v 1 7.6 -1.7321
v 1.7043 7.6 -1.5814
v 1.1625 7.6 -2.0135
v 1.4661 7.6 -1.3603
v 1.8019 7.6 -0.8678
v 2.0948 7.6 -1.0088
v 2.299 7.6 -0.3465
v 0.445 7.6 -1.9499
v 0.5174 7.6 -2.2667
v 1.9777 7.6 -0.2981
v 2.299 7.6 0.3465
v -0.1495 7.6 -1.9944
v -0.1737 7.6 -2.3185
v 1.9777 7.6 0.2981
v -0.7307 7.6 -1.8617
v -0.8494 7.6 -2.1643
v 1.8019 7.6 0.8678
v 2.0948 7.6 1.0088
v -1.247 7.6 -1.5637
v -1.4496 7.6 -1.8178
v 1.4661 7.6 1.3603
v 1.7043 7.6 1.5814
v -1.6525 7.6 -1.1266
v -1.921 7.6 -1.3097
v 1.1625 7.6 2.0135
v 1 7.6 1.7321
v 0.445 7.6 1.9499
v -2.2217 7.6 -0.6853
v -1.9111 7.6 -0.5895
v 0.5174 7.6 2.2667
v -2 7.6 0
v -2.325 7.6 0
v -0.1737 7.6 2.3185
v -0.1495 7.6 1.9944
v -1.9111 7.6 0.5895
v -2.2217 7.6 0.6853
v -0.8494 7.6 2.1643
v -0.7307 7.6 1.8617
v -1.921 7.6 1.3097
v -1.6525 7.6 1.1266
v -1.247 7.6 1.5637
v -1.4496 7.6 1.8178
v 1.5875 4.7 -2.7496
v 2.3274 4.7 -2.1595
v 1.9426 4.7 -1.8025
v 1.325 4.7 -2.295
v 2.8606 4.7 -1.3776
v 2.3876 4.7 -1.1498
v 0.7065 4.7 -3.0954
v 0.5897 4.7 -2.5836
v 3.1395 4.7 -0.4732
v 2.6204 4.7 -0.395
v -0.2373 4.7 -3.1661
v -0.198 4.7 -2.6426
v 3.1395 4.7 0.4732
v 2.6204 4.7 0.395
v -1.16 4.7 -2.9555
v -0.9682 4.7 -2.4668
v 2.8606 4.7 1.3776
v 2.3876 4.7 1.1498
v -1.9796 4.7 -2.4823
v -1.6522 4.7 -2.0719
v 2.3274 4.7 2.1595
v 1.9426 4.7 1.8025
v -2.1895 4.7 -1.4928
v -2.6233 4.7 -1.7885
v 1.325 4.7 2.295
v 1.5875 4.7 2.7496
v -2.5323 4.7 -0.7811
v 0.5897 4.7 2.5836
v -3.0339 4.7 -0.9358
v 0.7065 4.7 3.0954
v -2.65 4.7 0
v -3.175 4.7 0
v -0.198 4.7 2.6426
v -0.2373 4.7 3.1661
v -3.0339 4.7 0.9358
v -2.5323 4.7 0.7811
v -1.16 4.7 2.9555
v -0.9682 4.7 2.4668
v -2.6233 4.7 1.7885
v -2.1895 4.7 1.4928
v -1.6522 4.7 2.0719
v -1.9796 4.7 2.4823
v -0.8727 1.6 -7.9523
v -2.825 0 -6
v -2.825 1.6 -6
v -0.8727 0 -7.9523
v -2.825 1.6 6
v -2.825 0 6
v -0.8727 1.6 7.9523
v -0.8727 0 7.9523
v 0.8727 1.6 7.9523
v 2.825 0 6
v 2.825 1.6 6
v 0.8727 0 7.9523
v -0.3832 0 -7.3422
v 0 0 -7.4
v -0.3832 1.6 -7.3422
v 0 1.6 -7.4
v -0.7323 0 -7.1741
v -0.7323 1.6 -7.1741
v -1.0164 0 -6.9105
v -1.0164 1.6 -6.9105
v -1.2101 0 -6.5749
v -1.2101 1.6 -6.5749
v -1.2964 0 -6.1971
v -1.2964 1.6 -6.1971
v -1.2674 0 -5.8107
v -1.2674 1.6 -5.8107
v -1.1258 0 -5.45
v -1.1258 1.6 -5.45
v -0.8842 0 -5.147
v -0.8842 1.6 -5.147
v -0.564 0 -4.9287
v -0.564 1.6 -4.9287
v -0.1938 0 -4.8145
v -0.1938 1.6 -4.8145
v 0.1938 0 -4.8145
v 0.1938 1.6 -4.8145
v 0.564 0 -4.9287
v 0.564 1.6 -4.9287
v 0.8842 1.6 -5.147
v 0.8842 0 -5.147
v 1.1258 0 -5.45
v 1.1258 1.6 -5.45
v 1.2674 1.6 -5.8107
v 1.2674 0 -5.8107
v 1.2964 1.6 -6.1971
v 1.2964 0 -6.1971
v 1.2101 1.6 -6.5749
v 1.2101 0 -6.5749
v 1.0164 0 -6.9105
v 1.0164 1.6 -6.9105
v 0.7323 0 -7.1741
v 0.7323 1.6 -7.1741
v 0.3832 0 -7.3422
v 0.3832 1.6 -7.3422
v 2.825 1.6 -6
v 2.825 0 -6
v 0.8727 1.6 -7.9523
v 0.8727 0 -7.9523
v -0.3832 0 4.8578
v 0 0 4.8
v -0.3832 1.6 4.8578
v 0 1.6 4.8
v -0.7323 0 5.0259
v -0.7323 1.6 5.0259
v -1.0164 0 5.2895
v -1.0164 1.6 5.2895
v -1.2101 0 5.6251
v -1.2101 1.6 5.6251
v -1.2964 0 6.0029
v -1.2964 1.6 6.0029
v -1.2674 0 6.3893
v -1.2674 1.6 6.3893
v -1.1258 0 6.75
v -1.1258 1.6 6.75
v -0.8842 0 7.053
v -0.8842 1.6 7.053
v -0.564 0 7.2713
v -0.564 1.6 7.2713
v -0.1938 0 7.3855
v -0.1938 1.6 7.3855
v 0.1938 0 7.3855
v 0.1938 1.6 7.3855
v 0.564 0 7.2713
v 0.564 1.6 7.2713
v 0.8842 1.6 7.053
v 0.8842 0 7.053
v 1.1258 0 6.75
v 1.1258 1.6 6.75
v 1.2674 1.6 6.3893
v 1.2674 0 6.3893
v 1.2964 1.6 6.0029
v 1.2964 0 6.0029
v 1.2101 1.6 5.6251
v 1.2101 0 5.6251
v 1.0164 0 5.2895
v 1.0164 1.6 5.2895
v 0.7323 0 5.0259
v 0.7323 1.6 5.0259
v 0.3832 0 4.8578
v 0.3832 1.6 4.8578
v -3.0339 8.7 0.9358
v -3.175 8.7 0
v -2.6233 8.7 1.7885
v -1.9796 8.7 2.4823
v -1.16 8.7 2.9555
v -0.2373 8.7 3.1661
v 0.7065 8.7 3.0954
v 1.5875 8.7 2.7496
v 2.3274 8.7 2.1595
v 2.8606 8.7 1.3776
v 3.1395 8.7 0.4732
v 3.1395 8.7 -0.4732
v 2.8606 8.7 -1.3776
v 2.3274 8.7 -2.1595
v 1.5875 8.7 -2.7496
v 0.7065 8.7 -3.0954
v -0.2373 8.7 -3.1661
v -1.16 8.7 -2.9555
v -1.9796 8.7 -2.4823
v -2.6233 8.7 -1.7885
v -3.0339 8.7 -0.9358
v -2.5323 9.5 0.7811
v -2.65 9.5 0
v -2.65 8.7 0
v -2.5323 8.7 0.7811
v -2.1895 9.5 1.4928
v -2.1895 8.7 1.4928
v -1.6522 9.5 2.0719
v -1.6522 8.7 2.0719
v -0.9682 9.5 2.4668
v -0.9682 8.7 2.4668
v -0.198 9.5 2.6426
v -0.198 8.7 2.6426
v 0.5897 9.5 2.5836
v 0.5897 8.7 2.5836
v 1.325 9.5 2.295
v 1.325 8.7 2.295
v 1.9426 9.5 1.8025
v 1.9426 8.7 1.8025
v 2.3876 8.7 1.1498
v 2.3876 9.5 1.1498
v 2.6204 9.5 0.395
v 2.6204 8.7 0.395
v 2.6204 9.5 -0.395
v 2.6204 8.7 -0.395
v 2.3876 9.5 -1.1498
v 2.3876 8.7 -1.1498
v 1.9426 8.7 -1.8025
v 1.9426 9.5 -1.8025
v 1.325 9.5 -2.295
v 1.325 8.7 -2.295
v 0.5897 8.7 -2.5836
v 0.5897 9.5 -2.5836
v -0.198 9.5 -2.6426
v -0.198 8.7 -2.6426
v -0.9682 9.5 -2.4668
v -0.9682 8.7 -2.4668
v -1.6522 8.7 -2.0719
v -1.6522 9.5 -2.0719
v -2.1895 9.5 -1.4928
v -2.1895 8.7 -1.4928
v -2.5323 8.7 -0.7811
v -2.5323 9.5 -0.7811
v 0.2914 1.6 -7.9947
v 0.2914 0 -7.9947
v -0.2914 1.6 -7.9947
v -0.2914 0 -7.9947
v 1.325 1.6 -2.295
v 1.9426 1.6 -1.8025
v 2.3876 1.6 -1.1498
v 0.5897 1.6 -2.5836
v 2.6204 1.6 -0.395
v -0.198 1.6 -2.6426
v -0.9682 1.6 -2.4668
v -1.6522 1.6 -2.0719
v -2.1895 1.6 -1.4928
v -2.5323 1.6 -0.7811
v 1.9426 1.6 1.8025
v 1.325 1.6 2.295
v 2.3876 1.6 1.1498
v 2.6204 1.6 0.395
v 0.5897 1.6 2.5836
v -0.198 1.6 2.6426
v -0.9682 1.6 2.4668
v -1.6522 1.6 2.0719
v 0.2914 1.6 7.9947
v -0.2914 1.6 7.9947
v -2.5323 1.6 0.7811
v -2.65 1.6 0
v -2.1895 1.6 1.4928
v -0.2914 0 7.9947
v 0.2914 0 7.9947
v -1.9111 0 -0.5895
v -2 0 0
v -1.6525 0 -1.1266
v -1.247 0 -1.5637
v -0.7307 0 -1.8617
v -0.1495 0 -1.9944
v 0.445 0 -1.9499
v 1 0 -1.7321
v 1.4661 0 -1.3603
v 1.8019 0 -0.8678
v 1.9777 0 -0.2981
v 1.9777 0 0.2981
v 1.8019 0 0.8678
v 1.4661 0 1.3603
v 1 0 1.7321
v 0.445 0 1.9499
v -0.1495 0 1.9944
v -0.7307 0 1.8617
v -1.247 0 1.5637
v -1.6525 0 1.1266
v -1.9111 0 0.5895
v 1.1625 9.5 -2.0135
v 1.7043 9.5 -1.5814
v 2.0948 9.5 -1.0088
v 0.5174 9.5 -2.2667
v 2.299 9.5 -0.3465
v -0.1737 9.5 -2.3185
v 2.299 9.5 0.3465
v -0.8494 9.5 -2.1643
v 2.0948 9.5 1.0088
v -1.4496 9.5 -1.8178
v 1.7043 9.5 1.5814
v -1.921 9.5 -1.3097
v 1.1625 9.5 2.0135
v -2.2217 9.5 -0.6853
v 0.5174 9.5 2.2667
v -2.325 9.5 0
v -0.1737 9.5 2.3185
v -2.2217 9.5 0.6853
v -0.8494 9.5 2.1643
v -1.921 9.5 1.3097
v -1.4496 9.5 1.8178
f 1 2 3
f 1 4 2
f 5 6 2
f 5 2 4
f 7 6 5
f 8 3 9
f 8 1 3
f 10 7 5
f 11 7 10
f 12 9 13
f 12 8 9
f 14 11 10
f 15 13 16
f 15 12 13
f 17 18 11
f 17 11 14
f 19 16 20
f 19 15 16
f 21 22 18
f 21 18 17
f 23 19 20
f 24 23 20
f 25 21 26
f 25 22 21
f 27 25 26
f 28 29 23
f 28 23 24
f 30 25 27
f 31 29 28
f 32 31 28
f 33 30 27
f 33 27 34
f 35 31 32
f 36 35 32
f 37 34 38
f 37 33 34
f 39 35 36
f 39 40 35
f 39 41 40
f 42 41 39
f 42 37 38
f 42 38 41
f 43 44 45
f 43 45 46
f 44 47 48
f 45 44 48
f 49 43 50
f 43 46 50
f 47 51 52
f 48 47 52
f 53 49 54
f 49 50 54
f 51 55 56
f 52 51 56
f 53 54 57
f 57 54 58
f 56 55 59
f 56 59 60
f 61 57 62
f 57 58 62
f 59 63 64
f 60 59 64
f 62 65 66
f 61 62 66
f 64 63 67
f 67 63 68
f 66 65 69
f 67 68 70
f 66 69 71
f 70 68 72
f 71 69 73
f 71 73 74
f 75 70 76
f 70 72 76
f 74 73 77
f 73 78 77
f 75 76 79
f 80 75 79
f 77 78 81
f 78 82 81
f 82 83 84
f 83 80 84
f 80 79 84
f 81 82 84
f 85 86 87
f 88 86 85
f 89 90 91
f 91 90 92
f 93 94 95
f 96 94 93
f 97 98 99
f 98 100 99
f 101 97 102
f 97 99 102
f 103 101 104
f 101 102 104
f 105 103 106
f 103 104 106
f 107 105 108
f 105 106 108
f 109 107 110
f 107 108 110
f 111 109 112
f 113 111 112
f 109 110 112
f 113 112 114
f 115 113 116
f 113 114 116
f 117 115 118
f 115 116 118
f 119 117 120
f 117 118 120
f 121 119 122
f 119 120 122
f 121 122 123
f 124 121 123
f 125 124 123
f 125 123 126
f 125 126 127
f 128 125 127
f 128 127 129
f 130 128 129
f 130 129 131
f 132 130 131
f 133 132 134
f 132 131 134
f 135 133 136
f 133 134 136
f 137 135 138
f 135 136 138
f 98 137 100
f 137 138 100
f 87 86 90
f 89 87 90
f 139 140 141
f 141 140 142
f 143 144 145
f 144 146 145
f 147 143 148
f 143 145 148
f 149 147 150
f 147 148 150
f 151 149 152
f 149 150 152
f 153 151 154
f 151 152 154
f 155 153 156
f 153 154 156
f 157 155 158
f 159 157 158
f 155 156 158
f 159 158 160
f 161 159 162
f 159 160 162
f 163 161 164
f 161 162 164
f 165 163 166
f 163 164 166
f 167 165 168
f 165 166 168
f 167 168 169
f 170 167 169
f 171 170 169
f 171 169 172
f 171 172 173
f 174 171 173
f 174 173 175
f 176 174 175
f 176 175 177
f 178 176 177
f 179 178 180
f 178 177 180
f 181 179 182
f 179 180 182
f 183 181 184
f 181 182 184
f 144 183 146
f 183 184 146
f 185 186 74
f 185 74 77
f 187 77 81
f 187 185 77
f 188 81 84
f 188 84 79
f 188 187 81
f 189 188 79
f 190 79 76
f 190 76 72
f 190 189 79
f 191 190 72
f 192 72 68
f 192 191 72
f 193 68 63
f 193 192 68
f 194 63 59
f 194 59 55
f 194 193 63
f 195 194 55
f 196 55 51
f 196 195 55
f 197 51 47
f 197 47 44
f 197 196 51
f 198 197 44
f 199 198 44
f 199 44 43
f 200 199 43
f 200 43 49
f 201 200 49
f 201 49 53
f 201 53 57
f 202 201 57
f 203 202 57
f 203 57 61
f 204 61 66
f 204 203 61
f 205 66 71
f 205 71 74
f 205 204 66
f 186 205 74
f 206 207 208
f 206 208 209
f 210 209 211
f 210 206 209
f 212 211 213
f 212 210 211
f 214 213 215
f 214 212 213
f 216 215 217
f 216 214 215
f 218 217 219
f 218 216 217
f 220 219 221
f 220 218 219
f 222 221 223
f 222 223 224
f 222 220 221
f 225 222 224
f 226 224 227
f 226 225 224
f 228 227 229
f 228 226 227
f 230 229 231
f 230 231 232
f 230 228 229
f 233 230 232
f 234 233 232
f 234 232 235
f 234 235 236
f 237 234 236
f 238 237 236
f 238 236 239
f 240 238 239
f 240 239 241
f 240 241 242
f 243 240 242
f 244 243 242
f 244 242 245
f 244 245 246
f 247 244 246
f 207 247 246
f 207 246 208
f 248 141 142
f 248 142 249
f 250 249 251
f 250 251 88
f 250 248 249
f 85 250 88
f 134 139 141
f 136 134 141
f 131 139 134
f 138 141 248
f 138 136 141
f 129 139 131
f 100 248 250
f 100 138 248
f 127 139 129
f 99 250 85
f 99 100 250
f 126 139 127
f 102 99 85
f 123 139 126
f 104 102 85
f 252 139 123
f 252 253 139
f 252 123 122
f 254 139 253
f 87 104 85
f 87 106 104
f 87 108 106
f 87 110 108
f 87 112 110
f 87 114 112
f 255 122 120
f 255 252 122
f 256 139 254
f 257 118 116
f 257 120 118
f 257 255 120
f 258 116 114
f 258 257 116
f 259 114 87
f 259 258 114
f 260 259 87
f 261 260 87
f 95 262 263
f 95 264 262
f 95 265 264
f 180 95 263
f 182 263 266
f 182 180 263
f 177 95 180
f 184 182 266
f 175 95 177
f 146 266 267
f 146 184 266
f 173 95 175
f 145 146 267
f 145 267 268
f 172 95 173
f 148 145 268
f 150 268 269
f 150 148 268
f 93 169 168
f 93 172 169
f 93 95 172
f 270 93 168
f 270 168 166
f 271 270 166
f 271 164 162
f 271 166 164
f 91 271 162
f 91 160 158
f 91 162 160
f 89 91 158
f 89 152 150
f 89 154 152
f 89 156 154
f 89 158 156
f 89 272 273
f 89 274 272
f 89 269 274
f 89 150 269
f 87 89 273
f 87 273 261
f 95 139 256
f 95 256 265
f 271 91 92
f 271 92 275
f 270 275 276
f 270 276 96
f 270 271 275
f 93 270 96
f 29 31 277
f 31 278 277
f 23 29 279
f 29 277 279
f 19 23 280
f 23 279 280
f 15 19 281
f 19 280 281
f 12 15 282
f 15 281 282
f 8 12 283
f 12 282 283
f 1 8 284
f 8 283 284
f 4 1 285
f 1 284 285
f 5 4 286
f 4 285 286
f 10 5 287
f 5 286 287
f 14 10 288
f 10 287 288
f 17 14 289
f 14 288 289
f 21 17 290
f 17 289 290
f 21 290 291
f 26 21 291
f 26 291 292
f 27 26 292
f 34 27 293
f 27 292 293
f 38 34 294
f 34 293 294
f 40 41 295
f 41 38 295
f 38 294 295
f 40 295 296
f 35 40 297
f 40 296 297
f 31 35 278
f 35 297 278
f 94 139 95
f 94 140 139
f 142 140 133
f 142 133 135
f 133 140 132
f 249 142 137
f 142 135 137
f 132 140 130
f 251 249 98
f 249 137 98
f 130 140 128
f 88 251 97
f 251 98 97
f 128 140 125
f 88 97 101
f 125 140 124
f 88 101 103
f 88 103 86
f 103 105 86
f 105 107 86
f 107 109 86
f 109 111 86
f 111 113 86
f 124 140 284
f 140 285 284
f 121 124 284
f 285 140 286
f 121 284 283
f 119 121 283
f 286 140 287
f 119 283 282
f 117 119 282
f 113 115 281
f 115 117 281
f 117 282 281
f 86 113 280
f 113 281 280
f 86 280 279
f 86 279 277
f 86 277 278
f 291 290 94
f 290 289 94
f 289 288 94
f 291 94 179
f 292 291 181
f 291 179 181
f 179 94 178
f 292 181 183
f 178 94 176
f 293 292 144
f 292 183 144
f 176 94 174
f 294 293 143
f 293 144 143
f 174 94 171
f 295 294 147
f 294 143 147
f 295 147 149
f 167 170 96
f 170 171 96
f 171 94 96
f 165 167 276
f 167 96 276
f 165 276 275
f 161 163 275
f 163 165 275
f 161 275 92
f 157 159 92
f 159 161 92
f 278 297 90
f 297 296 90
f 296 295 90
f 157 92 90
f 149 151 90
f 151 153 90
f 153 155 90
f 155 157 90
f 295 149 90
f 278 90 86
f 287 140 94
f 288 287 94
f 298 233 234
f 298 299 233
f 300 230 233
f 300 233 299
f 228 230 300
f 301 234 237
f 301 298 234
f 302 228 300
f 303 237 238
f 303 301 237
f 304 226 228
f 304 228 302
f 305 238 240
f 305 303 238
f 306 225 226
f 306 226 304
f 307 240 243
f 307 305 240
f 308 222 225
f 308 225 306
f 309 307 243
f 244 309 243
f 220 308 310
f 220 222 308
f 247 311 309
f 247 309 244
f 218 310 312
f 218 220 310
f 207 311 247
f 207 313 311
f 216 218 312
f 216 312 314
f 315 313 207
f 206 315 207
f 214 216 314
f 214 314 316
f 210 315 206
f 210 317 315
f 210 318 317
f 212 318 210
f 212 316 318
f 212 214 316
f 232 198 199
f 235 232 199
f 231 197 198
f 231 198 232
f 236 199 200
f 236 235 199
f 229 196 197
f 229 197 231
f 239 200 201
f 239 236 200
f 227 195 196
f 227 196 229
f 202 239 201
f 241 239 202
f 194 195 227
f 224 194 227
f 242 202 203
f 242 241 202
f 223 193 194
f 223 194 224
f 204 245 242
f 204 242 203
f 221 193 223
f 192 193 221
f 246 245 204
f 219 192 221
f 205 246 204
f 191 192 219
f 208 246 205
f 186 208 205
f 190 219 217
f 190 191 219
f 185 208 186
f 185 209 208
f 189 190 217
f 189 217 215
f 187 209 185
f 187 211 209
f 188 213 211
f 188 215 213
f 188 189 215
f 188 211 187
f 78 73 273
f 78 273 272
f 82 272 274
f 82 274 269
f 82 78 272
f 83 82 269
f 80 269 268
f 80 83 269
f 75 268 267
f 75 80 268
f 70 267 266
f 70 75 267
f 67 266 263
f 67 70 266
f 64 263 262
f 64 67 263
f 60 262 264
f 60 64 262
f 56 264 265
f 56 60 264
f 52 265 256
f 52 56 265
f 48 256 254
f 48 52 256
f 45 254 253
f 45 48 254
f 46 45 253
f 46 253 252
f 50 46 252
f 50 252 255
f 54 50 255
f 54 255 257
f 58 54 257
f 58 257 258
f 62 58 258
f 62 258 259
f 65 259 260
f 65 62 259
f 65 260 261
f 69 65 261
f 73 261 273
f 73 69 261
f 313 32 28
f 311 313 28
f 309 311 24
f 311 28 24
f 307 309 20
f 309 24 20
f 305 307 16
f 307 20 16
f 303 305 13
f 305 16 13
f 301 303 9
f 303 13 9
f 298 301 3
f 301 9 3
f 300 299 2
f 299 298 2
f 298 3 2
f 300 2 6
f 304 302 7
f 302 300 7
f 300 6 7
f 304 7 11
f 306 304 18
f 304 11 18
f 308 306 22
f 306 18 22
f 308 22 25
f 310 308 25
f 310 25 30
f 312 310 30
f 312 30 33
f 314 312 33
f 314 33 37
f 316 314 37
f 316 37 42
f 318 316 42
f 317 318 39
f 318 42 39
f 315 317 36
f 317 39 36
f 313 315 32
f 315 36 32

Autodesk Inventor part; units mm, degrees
ref_plane "YZ Plane" through (0, 0, 0) normal (1, 0, 0) x (0, 1, 0)
ref_plane "XZ Plane" through (0, 0, 0) normal (0, 1, 0) x (-1, 0, 0)
ref_plane "XY Plane" through (0, 0, 0) normal (0, 0, 1) x (1, 0, 0)
sketch "Sketch10" plane through (0, 0, 0) normal (0, 0, 1) x (1, 0, 0)
  line L0 (-2, 0) -> (-8, 0)
  line L1 (-8, 0) -> (-8, 1.6)
  line L2 (-8, 1.6) -> (-2.65, 1.6)
  line L3 (-2.65, 1.6) -> (-2.65, 4.7)
  line L4 (-2.65, 4.7) -> (-3.175, 4.7)
  line L5 (-3.175, 4.7) -> (-3.175, 8.7)
  line L6 (-2, 7.6) -> (-2, 0)
  line L7 (-3.175, 8.7) -> (-2.65, 8.7)
  line L8 (-2.65, 8.7) -> (-2.65, 9.5)
  line L9 (-2.65, 9.5) -> (-2.325, 9.5)
  line L10 (0, -1.9) -> (0, 11.4) projected
  line L11 (-2.325, 9.5) -> (-2.325, 7.6)
  line L12 (-2.325, 7.6) -> (-2, 7.6)
  point P0 (0, 0)
  dimension "d39" = 2
  dimension "d41" = 0.8
  dimension "d42" = 4
  dimension "d43" = 2.65
  dimension "d44" = 1.6
  dimension "d45" = 8
  dimension "d46" = 3.175
  dimension "d66" = 2.325
  dimension "d67" = 1.9
  dimension "d68" = 9.5
revolve "Revolution1" add sketch "Sketch10" angle 360 about axis through (0, -10, 0) along (0, 1, 0)
sketch "Sketch11" plane through (0, 0, 0) normal (0, -1, 0) x (1, 0, 0)
  circle A0 centre (0, 0) radius 8 projected
  line L0 (2.825, -7.4846) -> (2.825, 7.4846)
  line L1 (-2.825, -7.4846) -> (-2.825, 7.4846)
  arc A1 (2.825, -7.4846) -> (2.825, 7.4846) centre (0, 0) ccw
  arc A2 (-2.825, 7.4846) -> (-2.825, -7.4846) centre (0, 0) ccw
  dimension "d48" = 5.65
extrude "Extrusion7" cut sketch "Sketch11" against normal up to surface (1.6 mm away) contours A0 L0 | L1 A0
sketch "Sketch12" plane through (0, 0, 0) normal (0, -1, 0) x (1, 0, 0)
  line L0 (2.825, 7.4846) -> (2.825, -7.4846) projected
  line L1 (2.825, 6) -> (0.8727, 7.9523)
  line L2 (2.825, -6) -> (0.8727, -7.9523)
  arc A0 (-2.825, -7.4846) -> (2.825, -7.4846) centre (0, 0) ccw projected
  arc A1 (2.825, 7.4846) -> (-2.825, 7.4846) centre (0, 0) ccw projected
  line L3 (0, -11.2) -> (0, 11.2) projected
  line L4 (-2.825, 6) -> (-0.8727, 7.9523)
  line L5 (-2.825, -6) -> (-0.8727, -7.9523)
  line L6 (-2.825, 7.4846) -> (-2.825, -7.4846) projected
  dimension "d51" = 12
  dimension "d52" = 6
  dimension "d53" = 45
  dimension "d54" = 45
extrude "Extrusion8" cut sketch "Sketch12" against normal through all contours L0 L1 A1 | L0 A0 L2 | L4 L6 A1 | A0 L6 L5
sketch "Sketch13" plane through (0, 0, 0) normal (0, -1, 0) x (1, 0, 0)
  point P0 (0, 0)
  point P1 (0, 6.1)
  point P2 (0, -6.1)
  dimension "d57" = 12.2
  dimension "d58" = 6.1
hole "Hole3" at (0, 0, 6.1) at (0, 0, -6.1) direction (0, 1, 0) diameter 2.6 end through all
thread "Thread2" size "1/4-36 UNS" class "2A" standard "ANSI Unified Screw Threads" length 9
equation "\"d52\" = 0.5 * d51"
equation "\"d54\" = d53"
equation "\"d58\" = 0.5 * d57"
properties part number "SMA-PanelMount-Ni-AuPlated-Body" material "Brass"
